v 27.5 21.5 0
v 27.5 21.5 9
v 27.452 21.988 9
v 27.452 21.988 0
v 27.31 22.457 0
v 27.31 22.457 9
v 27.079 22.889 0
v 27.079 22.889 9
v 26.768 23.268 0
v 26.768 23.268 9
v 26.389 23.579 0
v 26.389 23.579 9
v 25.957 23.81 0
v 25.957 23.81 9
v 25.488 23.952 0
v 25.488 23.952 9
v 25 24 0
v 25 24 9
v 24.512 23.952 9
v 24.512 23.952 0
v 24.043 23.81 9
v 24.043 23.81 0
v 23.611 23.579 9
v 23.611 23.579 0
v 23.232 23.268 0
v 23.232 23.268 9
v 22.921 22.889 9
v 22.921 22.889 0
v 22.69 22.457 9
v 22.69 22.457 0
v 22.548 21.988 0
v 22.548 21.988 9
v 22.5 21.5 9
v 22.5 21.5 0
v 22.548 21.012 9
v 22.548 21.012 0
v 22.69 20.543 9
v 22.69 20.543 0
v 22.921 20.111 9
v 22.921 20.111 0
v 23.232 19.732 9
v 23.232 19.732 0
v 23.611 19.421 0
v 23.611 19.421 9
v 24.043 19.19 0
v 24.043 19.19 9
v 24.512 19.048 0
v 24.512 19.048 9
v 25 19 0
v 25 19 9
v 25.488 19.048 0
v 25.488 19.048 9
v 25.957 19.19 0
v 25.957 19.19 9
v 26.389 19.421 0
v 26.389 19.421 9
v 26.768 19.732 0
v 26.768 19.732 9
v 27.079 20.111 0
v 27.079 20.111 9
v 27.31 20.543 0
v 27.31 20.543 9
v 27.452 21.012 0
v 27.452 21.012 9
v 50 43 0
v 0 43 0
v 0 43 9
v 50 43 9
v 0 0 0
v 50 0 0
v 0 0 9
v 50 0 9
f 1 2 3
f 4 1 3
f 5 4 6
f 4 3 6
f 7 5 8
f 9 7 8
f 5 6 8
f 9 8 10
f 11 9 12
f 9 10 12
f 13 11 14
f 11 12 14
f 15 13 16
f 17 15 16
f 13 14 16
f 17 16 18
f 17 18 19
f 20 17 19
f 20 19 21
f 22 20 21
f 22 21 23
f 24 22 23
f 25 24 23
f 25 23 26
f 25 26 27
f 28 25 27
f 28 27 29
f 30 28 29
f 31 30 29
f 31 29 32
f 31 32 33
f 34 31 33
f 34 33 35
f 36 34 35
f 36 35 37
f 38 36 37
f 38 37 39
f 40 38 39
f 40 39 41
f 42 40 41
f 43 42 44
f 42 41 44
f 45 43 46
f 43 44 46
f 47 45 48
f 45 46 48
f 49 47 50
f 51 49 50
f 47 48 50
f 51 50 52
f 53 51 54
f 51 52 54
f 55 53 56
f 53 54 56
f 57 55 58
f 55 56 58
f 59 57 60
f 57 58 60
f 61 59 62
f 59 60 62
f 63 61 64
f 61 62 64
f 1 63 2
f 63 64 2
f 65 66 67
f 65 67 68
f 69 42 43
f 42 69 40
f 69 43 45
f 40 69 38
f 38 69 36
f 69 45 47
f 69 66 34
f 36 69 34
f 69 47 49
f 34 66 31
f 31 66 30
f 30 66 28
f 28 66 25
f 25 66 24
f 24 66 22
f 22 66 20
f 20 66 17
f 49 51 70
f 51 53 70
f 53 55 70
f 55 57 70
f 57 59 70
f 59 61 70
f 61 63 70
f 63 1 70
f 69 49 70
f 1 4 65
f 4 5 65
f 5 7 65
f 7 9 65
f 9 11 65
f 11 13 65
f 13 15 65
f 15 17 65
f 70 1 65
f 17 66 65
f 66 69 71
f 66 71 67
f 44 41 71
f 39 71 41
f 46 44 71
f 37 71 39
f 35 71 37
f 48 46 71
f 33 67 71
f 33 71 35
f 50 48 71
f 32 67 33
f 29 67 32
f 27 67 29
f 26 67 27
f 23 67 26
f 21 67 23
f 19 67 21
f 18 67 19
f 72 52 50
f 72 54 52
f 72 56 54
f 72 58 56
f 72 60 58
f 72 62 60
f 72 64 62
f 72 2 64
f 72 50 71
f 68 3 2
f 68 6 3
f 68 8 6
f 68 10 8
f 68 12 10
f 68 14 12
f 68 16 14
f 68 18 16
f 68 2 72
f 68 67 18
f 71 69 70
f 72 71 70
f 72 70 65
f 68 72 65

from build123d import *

# Parameters (mm, degrees)
ESQUISSE3_W                  = 50
ESQUISSE3_H                  = 43
BOSS_EXTRU_1_DEPTH           = 9
ESQUISSE4_R                  = 2.5
ENL_V_MAT_EXTRU_1_DEPTH      = 1
ENL_V_MAT_EXTRU_1_DEPTH_BACK = 10


with BuildPart() as part:
    # Esquisse3 → Boss.-Extru.1 (new body)
    with BuildSketch(Plane.XY):
        with Locations((25, 21.5)):
            Rectangle(ESQUISSE3_W, ESQUISSE3_H)
    extrude(amount=BOSS_EXTRU_1_DEPTH)

    # Esquisse4 → Enlèv. mat.-Extru.1 (cut, two sides)
    with BuildSketch(Plane.XY.offset(9)) as enl_v_mat_extru_1_sk:
        with Locations((25, 21.5)):
            Circle(ESQUISSE4_R)
    extrude(amount=ENL_V_MAT_EXTRU_1_DEPTH, mode=Mode.SUBTRACT)
    extrude(enl_v_mat_extru_1_sk.sketch, amount=-ENL_V_MAT_EXTRU_1_DEPTH_BACK, mode=Mode.SUBTRACT)


solid = part.part
